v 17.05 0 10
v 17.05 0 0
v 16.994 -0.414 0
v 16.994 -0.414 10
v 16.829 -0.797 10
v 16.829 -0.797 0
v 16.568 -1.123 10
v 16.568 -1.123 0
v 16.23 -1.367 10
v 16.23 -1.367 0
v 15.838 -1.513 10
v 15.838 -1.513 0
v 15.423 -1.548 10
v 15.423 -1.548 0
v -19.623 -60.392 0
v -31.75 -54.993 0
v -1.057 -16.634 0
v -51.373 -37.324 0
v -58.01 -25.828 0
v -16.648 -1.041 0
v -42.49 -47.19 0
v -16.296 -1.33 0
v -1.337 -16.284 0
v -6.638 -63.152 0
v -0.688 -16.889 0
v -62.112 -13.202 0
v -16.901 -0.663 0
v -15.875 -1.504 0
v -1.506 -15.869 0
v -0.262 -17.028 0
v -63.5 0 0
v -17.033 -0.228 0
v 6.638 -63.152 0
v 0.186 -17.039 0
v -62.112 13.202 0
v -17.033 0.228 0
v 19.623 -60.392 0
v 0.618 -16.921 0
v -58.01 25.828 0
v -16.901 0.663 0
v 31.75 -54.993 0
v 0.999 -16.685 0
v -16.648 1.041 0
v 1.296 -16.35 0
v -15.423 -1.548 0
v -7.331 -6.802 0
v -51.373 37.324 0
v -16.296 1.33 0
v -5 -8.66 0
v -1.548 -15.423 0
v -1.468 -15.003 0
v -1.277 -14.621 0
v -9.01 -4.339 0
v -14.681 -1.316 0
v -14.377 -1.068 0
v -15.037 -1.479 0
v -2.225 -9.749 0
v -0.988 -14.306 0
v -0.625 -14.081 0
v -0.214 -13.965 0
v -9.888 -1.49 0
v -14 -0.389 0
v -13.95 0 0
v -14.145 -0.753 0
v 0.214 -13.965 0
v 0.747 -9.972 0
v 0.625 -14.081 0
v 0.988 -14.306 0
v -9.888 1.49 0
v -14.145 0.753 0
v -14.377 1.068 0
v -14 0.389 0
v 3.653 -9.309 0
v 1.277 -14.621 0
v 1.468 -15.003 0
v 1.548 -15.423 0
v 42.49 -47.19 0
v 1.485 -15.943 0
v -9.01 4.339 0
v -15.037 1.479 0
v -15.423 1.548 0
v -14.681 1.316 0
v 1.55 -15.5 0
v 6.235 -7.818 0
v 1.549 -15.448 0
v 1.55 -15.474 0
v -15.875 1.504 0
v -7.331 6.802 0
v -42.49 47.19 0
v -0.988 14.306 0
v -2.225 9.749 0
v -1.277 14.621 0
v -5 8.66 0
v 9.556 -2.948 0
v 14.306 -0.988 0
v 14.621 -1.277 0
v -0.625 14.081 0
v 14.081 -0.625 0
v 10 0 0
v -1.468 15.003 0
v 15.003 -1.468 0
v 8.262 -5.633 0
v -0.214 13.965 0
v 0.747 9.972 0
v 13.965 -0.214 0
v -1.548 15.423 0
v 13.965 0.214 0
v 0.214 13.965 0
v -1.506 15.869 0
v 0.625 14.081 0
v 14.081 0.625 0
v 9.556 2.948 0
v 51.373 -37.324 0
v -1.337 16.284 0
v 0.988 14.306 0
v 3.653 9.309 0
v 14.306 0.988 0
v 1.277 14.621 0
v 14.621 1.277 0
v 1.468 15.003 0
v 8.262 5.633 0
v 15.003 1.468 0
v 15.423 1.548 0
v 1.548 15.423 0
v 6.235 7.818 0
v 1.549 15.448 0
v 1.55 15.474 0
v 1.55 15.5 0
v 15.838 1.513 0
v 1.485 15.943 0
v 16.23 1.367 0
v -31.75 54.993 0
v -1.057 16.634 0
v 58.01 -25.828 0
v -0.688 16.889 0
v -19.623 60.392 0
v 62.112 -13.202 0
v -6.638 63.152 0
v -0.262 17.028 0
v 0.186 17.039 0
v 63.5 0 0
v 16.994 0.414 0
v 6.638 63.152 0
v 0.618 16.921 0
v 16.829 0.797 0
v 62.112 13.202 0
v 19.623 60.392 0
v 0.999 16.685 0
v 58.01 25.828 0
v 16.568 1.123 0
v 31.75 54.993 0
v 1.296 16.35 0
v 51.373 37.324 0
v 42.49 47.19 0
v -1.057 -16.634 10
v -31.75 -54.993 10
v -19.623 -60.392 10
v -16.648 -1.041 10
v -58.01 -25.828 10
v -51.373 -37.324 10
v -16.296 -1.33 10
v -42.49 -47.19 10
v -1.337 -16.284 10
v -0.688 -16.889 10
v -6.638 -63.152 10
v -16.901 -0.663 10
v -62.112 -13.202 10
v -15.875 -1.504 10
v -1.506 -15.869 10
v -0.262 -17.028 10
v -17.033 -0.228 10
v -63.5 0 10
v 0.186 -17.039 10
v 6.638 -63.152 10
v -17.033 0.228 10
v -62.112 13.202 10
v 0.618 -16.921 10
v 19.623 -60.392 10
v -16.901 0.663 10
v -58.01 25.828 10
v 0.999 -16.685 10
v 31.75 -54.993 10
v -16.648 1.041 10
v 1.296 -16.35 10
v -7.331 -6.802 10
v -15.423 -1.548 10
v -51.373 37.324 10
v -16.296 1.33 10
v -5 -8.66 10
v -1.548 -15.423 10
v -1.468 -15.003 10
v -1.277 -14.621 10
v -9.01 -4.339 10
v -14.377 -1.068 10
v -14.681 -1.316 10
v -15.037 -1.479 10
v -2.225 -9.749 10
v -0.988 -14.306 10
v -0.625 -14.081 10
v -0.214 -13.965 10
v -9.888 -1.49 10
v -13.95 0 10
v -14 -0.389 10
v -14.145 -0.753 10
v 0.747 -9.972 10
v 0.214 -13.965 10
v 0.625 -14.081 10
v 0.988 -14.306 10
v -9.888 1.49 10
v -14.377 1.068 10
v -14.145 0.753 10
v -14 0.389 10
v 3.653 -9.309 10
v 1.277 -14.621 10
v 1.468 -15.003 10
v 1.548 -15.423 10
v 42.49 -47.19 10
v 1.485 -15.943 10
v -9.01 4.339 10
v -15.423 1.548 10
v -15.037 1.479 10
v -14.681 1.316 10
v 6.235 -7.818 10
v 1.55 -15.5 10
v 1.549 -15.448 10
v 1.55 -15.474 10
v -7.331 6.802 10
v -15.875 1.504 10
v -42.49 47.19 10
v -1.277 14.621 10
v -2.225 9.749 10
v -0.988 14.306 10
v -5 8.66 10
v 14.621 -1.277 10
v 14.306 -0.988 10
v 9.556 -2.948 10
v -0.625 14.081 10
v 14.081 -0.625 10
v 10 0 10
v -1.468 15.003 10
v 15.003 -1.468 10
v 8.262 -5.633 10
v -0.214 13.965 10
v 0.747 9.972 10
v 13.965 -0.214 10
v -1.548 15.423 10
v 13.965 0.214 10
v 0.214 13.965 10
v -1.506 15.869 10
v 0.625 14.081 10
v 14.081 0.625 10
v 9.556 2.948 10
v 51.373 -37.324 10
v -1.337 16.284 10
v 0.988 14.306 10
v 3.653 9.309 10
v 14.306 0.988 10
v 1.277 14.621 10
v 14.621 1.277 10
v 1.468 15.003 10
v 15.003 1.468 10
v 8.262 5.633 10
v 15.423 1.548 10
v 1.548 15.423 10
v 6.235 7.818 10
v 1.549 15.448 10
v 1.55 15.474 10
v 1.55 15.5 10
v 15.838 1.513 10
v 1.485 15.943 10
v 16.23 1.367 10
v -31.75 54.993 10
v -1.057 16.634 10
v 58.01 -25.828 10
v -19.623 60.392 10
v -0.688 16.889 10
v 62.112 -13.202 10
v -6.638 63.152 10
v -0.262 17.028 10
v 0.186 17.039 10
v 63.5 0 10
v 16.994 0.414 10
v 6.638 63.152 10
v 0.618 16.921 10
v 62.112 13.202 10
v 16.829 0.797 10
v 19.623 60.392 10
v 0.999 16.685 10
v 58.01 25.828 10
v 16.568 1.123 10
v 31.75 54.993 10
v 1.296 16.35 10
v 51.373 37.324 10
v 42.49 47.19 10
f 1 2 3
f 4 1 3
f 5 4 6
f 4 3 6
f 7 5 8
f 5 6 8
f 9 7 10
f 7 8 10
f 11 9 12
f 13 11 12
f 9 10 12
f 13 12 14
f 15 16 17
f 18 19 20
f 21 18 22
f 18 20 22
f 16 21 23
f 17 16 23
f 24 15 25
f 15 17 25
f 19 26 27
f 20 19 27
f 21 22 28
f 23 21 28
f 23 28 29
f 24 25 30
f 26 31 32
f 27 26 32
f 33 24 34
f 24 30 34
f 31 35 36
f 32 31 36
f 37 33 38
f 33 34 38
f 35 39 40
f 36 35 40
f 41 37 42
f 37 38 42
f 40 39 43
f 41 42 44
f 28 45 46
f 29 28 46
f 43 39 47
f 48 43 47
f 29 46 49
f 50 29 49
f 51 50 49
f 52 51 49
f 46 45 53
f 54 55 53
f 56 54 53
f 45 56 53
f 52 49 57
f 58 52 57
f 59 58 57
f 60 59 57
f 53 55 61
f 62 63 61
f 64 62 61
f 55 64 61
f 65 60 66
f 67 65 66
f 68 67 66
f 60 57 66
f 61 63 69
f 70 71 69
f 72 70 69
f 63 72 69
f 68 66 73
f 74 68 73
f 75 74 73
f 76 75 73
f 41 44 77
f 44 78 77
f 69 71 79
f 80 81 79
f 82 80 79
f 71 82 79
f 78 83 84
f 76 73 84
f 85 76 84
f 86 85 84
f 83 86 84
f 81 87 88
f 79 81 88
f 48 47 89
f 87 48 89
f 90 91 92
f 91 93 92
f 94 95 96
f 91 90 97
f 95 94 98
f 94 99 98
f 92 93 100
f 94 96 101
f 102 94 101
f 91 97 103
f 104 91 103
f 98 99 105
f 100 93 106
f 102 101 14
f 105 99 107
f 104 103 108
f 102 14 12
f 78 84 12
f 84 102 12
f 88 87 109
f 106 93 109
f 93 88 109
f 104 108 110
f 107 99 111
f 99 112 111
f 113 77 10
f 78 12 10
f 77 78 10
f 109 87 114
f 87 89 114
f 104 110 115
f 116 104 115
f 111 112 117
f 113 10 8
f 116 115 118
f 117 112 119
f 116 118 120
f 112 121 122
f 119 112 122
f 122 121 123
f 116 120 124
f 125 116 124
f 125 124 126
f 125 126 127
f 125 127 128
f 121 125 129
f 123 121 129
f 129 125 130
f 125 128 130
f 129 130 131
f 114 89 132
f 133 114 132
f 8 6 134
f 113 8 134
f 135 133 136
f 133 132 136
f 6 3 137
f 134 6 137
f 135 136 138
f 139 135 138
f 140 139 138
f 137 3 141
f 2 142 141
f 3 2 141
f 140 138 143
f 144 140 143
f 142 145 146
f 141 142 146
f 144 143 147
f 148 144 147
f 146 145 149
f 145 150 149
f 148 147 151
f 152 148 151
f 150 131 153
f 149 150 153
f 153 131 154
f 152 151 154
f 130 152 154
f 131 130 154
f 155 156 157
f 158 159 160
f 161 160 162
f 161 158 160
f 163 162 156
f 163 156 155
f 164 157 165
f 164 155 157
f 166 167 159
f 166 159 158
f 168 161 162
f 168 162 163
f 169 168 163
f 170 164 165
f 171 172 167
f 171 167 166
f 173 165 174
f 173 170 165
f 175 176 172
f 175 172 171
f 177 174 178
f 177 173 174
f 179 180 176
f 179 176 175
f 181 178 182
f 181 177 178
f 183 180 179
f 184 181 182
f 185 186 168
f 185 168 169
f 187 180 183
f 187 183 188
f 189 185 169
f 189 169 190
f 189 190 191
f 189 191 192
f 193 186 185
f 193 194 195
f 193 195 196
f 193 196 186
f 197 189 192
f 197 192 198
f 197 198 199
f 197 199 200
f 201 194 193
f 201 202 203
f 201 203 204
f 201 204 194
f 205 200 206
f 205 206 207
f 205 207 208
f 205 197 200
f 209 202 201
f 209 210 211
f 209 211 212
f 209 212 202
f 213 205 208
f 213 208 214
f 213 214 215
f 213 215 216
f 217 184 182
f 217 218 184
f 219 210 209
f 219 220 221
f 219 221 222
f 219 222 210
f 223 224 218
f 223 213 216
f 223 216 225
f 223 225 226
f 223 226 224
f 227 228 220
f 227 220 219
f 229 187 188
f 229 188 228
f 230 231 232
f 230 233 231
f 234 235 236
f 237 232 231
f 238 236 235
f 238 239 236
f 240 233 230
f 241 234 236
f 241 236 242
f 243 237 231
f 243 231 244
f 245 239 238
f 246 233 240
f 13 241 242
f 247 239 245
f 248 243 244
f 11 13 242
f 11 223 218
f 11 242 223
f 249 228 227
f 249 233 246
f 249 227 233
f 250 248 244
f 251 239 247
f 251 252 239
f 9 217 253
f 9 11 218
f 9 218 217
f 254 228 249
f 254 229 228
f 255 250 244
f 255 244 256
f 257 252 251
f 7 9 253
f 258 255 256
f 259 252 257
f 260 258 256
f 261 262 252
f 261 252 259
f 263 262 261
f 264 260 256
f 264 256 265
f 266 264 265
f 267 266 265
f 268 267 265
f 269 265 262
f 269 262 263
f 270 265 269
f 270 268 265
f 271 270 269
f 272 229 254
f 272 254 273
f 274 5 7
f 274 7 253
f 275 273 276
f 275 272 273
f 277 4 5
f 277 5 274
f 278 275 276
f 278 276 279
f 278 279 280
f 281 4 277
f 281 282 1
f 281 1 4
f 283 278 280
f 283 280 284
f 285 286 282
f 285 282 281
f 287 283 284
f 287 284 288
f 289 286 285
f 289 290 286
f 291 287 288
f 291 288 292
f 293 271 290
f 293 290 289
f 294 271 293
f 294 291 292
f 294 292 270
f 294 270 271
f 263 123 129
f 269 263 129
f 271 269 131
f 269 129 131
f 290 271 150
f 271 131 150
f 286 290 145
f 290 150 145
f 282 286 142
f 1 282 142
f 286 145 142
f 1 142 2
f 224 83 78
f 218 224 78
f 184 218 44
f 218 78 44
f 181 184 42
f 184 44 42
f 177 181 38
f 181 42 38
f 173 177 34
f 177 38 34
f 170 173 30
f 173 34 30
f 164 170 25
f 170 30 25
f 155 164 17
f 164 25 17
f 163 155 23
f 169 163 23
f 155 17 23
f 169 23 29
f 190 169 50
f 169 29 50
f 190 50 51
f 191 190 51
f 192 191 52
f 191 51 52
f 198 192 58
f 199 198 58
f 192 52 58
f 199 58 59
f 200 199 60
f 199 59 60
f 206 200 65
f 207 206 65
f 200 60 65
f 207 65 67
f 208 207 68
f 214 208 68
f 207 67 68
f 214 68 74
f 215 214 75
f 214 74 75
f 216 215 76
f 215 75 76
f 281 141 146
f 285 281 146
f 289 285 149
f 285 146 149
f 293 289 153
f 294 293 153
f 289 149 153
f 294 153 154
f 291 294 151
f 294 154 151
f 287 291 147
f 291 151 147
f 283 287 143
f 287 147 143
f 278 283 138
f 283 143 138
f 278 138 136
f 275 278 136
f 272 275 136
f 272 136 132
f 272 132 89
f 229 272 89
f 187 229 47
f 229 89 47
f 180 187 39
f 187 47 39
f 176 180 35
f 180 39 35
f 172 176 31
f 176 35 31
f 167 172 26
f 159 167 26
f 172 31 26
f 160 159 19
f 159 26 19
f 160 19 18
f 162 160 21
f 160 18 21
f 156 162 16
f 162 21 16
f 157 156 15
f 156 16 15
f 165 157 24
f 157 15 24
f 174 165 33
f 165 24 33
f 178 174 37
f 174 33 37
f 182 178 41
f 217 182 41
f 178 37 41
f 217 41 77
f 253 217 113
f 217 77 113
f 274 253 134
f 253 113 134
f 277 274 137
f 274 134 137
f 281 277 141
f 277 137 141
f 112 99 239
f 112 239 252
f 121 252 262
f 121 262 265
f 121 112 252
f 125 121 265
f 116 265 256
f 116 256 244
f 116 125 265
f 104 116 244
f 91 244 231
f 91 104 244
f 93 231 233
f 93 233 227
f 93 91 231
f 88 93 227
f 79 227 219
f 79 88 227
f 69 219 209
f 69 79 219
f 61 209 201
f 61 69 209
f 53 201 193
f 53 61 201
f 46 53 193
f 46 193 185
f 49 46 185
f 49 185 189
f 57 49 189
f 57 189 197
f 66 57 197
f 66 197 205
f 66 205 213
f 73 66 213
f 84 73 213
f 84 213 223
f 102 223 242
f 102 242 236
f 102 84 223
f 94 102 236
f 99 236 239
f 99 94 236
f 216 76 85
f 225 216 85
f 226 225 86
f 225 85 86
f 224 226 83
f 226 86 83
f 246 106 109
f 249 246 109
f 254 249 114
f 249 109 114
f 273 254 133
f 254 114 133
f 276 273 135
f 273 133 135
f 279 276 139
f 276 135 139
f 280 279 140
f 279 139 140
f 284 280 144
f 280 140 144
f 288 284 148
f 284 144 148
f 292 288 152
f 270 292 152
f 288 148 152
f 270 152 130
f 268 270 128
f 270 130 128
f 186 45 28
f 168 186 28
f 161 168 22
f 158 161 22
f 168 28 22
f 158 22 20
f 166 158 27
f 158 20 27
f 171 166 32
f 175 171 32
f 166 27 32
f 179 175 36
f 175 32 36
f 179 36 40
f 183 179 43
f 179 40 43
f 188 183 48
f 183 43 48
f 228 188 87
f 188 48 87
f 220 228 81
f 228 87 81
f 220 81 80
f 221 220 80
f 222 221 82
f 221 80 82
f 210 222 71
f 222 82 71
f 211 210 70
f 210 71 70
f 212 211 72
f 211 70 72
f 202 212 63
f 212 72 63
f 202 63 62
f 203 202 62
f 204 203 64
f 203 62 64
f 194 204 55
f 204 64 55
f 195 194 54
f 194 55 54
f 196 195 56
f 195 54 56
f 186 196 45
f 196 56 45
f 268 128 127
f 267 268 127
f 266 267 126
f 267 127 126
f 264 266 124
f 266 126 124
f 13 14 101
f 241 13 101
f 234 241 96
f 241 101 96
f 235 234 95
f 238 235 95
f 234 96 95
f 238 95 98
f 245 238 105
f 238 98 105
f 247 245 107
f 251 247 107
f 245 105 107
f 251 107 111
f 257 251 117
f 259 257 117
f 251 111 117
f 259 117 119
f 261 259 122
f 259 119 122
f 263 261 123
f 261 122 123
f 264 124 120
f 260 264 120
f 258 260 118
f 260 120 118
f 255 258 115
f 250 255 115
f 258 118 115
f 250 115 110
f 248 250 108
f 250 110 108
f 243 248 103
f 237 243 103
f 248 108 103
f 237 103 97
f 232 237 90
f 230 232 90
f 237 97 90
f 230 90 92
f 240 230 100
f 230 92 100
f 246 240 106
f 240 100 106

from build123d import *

# Parameters (mm, degrees)
F0_R     = 63.5
F0_R_2   = 10
F1_DEPTH = 10


with BuildPart() as f1:
    # F0 (on Top) → F1 (new body)
    with BuildSketch(Plane.XY):
        Circle(F0_R)
        with BuildLine():
            ThreePointArc((1.548061, 15.4225), (10.960155, 10.960155), (15.4225, 1.548061))
            ThreePointArc((15.4225, 1.548061), (16.568264, 1.123082), (17.05, 0))
            ThreePointArc((17.05, 0), (16.568264, -1.123082), (15.4225, -1.548061))
            ThreePointArc((15.4225, -1.548061), (10.960155, -10.960155), (1.548061, -15.4225))
            ThreePointArc((1.548061, -15.4225), (1.549515, -15.461238), (1.55, -15.5))
            ThreePointArc((1.55, -15.5), (-0.038762, -17.049515), (-1.548061, -15.4225))
            ThreePointArc((-1.548061, -15.4225), (-10.960155, -10.960155), (-15.4225, -1.548061))
            ThreePointArc((-15.4225, -1.548061), (-17.05, 0), (-15.4225, 1.548061))
            ThreePointArc((-15.4225, 1.548061), (-10.960155, 10.960155), (-1.548061, 15.4225))
            ThreePointArc((-1.548061, 15.4225), (-0.038762, 17.049515), (1.55, 15.5))
            ThreePointArc((1.55, 15.5), (1.549515, 15.461238), (1.548061, 15.4225))
        make_face(mode=Mode.SUBTRACT)
        with BuildLine():
            ThreePointArc((15.4225, -1.548061), (13.95, 0), (15.4225, 1.548061))
            ThreePointArc((15.4225, 1.548061), (10.960155, 10.960155), (1.548061, 15.4225))
            ThreePointArc((1.548061, 15.4225), (0, 13.95), (-1.548061, 15.4225))
            ThreePointArc((-1.548061, 15.4225), (-10.960155, 10.960155), (-15.4225, 1.548061))
            ThreePointArc((-15.4225, 1.548061), (-14.376918, 1.068264), (-13.95, 0))
            ThreePointArc((-13.95, 0), (-14.376918, -1.068264), (-15.4225, -1.548061))
            ThreePointArc((-15.4225, -1.548061), (-10.960155, -10.960155), (-1.548061, -15.4225))
            ThreePointArc((-1.548061, -15.4225), (0, -13.95), (1.548061, -15.4225))
            ThreePointArc((1.548061, -15.4225), (10.960155, -10.960155), (15.4225, -1.548061))
        make_face()
        Circle(F0_R_2, mode=Mode.SUBTRACT)
    extrude(amount=F1_DEPTH)


solid = f1.part
